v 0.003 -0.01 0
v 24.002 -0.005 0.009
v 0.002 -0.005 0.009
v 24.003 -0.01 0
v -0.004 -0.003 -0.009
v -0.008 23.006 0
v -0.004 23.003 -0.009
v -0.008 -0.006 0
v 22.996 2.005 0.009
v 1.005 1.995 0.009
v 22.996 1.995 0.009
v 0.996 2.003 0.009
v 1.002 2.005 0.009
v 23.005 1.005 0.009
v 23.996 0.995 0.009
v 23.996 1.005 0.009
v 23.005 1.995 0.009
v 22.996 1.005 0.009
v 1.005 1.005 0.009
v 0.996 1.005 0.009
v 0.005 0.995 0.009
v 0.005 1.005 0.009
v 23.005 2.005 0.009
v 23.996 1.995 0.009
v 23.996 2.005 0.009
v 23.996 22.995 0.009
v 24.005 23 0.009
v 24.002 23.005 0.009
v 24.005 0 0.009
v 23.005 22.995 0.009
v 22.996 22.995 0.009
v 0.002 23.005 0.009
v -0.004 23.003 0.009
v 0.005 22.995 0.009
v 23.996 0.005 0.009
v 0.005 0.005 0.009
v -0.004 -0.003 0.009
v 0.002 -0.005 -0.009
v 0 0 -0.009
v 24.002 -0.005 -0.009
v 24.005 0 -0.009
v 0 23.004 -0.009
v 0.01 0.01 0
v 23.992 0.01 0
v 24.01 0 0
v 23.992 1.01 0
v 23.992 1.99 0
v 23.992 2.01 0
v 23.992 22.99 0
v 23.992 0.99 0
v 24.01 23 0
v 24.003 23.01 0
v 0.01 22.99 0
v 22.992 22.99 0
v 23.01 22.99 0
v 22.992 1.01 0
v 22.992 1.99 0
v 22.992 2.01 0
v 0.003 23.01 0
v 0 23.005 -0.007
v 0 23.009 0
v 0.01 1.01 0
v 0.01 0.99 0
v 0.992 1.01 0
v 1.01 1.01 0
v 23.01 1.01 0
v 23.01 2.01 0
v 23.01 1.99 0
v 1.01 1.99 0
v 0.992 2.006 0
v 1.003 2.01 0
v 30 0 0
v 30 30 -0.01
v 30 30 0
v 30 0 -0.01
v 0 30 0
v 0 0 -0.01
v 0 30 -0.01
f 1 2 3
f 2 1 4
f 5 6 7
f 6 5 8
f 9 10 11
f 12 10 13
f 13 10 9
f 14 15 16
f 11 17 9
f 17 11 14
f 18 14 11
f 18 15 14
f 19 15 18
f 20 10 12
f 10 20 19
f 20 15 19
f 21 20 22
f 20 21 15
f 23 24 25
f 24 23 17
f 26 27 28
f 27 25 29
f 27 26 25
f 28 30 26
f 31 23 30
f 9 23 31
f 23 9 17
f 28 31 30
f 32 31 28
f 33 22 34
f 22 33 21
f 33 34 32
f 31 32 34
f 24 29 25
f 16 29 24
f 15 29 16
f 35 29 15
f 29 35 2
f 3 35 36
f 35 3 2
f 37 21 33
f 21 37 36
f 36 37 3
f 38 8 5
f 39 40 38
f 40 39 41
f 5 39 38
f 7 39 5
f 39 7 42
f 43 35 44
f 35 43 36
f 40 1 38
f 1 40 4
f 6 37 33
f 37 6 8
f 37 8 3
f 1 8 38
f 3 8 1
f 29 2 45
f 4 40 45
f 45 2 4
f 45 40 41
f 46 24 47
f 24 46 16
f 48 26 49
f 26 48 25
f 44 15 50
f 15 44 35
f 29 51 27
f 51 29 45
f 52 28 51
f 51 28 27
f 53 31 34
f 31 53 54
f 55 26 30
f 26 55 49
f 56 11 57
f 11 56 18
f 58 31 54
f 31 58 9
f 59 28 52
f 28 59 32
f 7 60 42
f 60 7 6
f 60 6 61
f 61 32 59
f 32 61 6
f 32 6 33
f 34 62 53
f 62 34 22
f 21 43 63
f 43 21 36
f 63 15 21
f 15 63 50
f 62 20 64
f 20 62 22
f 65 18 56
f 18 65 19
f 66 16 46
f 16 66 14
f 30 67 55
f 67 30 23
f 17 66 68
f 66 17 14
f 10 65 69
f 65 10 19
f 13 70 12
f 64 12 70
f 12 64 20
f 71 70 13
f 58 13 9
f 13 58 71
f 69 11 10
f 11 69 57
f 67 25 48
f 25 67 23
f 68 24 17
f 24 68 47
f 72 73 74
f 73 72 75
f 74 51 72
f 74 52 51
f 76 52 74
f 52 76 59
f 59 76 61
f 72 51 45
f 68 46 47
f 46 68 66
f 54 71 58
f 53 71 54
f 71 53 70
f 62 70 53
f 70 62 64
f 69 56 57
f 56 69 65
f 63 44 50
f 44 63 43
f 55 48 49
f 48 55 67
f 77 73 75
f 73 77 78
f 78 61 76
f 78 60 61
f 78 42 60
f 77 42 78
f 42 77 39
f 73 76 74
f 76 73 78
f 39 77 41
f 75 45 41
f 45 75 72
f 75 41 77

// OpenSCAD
hull(){
    translate([0, 0]) sphere(0.01);
    translate([1, 0]) sphere(0.01);
}
hull(){
    translate([1, 0]) sphere(0.01);
    translate([2, 0]) sphere(0.01);
}
hull(){
    translate([2, 0]) sphere(0.01);
    translate([3, 0]) sphere(0.01);
}
hull(){
    translate([3, 0]) sphere(0.01);
    translate([4, 0]) sphere(0.01);
}
hull(){
    translate([4, 0]) sphere(0.01);
    translate([5, 0]) sphere(0.01);
}
hull(){
    translate([5, 0]) sphere(0.01);
    translate([6, 0]) sphere(0.01);
}
hull(){
    translate([6, 0]) sphere(0.01);
    translate([7, 0]) sphere(0.01);
}
hull(){
    translate([7, 0]) sphere(0.01);
    translate([8, 0]) sphere(0.01);
}
hull(){
    translate([8, 0]) sphere(0.01);
    translate([9, 0]) sphere(0.01);
}
hull(){
    translate([9, 0]) sphere(0.01);
    translate([10, 0]) sphere(0.01);
}
hull(){
    translate([10, 0]) sphere(0.01);
    translate([11, 0]) sphere(0.01);
}
hull(){
    translate([11, 0]) sphere(0.01);
    translate([12, 0]) sphere(0.01);
}
hull(){
    translate([12, 0]) sphere(0.01);
    translate([13, 0]) sphere(0.01);
}
hull(){
    translate([13, 0]) sphere(0.01);
    translate([14, 0]) sphere(0.01);
}
hull(){
    translate([14, 0]) sphere(0.01);
    translate([15, 0]) sphere(0.01);
}
hull(){
    translate([15, 0]) sphere(0.01);
    translate([16, 0]) sphere(0.01);
}
hull(){
    translate([16, 0]) sphere(0.01);
    translate([17, 0]) sphere(0.01);
}
hull(){
    translate([17, 0]) sphere(0.01);
    translate([18, 0]) sphere(0.01);
}
hull(){
    translate([18, 0]) sphere(0.01);
    translate([19, 0]) sphere(0.01);
}
hull(){
    translate([19, 0]) sphere(0.01);
    translate([20, 0]) sphere(0.01);
}
hull(){
    translate([20, 0]) sphere(0.01);
    translate([21, 0]) sphere(0.01);
}
hull(){
    translate([21, 0]) sphere(0.01);
    translate([22, 0]) sphere(0.01);
}
hull(){
    translate([22, 0]) sphere(0.01);
    translate([23, 0]) sphere(0.01);
}
hull(){
    translate([23, 0]) sphere(0.01);
    translate([24, 0]) sphere(0.01);
}
hull(){
    translate([24, 0]) sphere(0.01);
    translate([24, 1]) sphere(0.01);
}
hull(){
    translate([24, 1]) sphere(0.01);
    translate([24, 2]) sphere(0.01);
}
hull(){
    translate([24, 2]) sphere(0.01);
    translate([24, 3]) sphere(0.01);
}
hull(){
    translate([24, 3]) sphere(0.01);
    translate([24, 4]) sphere(0.01);
}
hull(){
    translate([24, 4]) sphere(0.01);
    translate([24, 5]) sphere(0.01);
}
hull(){
    translate([24, 5]) sphere(0.01);
    translate([24, 6]) sphere(0.01);
}
hull(){
    translate([24, 6]) sphere(0.01);
    translate([24, 7]) sphere(0.01);
}
hull(){
    translate([24, 7]) sphere(0.01);
    translate([24, 8]) sphere(0.01);
}
hull(){
    translate([24, 8]) sphere(0.01);
    translate([24, 9]) sphere(0.01);
}
hull(){
    translate([24, 9]) sphere(0.01);
    translate([24, 10]) sphere(0.01);
}
hull(){
    translate([24, 10]) sphere(0.01);
    translate([24, 11]) sphere(0.01);
}
hull(){
    translate([24, 11]) sphere(0.01);
    translate([24, 12]) sphere(0.01);
}
hull(){
    translate([24, 12]) sphere(0.01);
    translate([24, 13]) sphere(0.01);
}
hull(){
    translate([24, 13]) sphere(0.01);
    translate([24, 14]) sphere(0.01);
}
hull(){
    translate([24, 14]) sphere(0.01);
    translate([24, 15]) sphere(0.01);
}
hull(){
    translate([24, 15]) sphere(0.01);
    translate([24, 16]) sphere(0.01);
}
hull(){
    translate([24, 16]) sphere(0.01);
    translate([24, 17]) sphere(0.01);
}
hull(){
    translate([24, 17]) sphere(0.01);
    translate([24, 18]) sphere(0.01);
}
hull(){
    translate([24, 18]) sphere(0.01);
    translate([24, 19]) sphere(0.01);
}
hull(){
    translate([24, 19]) sphere(0.01);
    translate([24, 20]) sphere(0.01);
}
hull(){
    translate([24, 20]) sphere(0.01);
    translate([24, 21]) sphere(0.01);
}
hull(){
    translate([24, 21]) sphere(0.01);
    translate([24, 22]) sphere(0.01);
}
hull(){
    translate([24, 22]) sphere(0.01);
    translate([24, 23]) sphere(0.01);
}
hull(){
    translate([24, 23]) sphere(0.01);
    translate([23, 23]) sphere(0.01);
}
hull(){
    translate([23, 23]) sphere(0.01);
    translate([22, 23]) sphere(0.01);
}
hull(){
    translate([22, 23]) sphere(0.01);
    translate([21, 23]) sphere(0.01);
}
hull(){
    translate([21, 23]) sphere(0.01);
    translate([20, 23]) sphere(0.01);
}
hull(){
    translate([20, 23]) sphere(0.01);
    translate([19, 23]) sphere(0.01);
}
hull(){
    translate([19, 23]) sphere(0.01);
    translate([18, 23]) sphere(0.01);
}
hull(){
    translate([18, 23]) sphere(0.01);
    translate([17, 23]) sphere(0.01);
}
hull(){
    translate([17, 23]) sphere(0.01);
    translate([16, 23]) sphere(0.01);
}
hull(){
    translate([16, 23]) sphere(0.01);
    translate([15, 23]) sphere(0.01);
}
hull(){
    translate([15, 23]) sphere(0.01);
    translate([14, 23]) sphere(0.01);
}
hull(){
    translate([14, 23]) sphere(0.01);
    translate([13, 23]) sphere(0.01);
}
hull(){
    translate([13, 23]) sphere(0.01);
    translate([12, 23]) sphere(0.01);
}
hull(){
    translate([12, 23]) sphere(0.01);
    translate([11, 23]) sphere(0.01);
}
hull(){
    translate([11, 23]) sphere(0.01);
    translate([10, 23]) sphere(0.01);
}
hull(){
    translate([10, 23]) sphere(0.01);
    translate([9, 23]) sphere(0.01);
}
hull(){
    translate([9, 23]) sphere(0.01);
    translate([8, 23]) sphere(0.01);
}
hull(){
    translate([8, 23]) sphere(0.01);
    translate([7, 23]) sphere(0.01);
}
hull(){
    translate([7, 23]) sphere(0.01);
    translate([6, 23]) sphere(0.01);
}
hull(){
    translate([6, 23]) sphere(0.01);
    translate([5, 23]) sphere(0.01);
}
hull(){
    translate([5, 23]) sphere(0.01);
    translate([4, 23]) sphere(0.01);
}
hull(){
    translate([4, 23]) sphere(0.01);
    translate([3, 23]) sphere(0.01);
}
hull(){
    translate([3, 23]) sphere(0.01);
    translate([2, 23]) sphere(0.01);
}
hull(){
    translate([2, 23]) sphere(0.01);
    translate([1, 23]) sphere(0.01);
}
hull(){
    translate([1, 23]) sphere(0.01);
    translate([0, 23]) sphere(0.01);
}
hull(){
    translate([0, 23]) sphere(0.01);
    translate([0, 22]) sphere(0.01);
}
hull(){
    translate([0, 22]) sphere(0.01);
    translate([0, 21]) sphere(0.01);
}
hull(){
    translate([0, 21]) sphere(0.01);
    translate([0, 20]) sphere(0.01);
}
hull(){
    translate([0, 20]) sphere(0.01);
    translate([0, 19]) sphere(0.01);
}
hull(){
    translate([0, 19]) sphere(0.01);
    translate([0, 18]) sphere(0.01);
}
hull(){
    translate([0, 18]) sphere(0.01);
    translate([0, 17]) sphere(0.01);
}
hull(){
    translate([0, 17]) sphere(0.01);
    translate([0, 16]) sphere(0.01);
}
hull(){
    translate([0, 16]) sphere(0.01);
    translate([0, 15]) sphere(0.01);
}
hull(){
    translate([0, 15]) sphere(0.01);
    translate([0, 14]) sphere(0.01);
}
hull(){
    translate([0, 14]) sphere(0.01);
    translate([0, 13]) sphere(0.01);
}
hull(){
    translate([0, 13]) sphere(0.01);
    translate([0, 12]) sphere(0.01);
}
hull(){
    translate([0, 12]) sphere(0.01);
    translate([0, 11]) sphere(0.01);
}
hull(){
    translate([0, 11]) sphere(0.01);
    translate([0, 10]) sphere(0.01);
}
hull(){
    translate([0, 10]) sphere(0.01);
    translate([0, 9]) sphere(0.01);
}
hull(){
    translate([0, 9]) sphere(0.01);
    translate([0, 8]) sphere(0.01);
}
hull(){
    translate([0, 8]) sphere(0.01);
    translate([0, 7]) sphere(0.01);
}
hull(){
    translate([0, 7]) sphere(0.01);
    translate([0, 6]) sphere(0.01);
}
hull(){
    translate([0, 6]) sphere(0.01);
    translate([0, 5]) sphere(0.01);
}
hull(){
    translate([0, 5]) sphere(0.01);
    translate([0, 4]) sphere(0.01);
}
hull(){
    translate([0, 4]) sphere(0.01);
    translate([0, 3]) sphere(0.01);
}
hull(){
    translate([0, 3]) sphere(0.01);
    translate([0, 2]) sphere(0.01);
}
hull(){
    translate([0, 2]) sphere(0.01);
    translate([0, 1]) sphere(0.01);
}
hull(){
    translate([0, 1]) sphere(0.01);
    translate([1, 1]) sphere(0.01);
}
hull(){
    translate([1, 1]) sphere(0.01);
    translate([2, 1]) sphere(0.01);
}
hull(){
    translate([2, 1]) sphere(0.01);
    translate([3, 1]) sphere(0.01);
}
hull(){
    translate([3, 1]) sphere(0.01);
    translate([4, 1]) sphere(0.01);
}
hull(){
    translate([4, 1]) sphere(0.01);
    translate([5, 1]) sphere(0.01);
}
hull(){
    translate([5, 1]) sphere(0.01);
    translate([6, 1]) sphere(0.01);
}
hull(){
    translate([6, 1]) sphere(0.01);
    translate([7, 1]) sphere(0.01);
}
hull(){
    translate([7, 1]) sphere(0.01);
    translate([8, 1]) sphere(0.01);
}
hull(){
    translate([8, 1]) sphere(0.01);
    translate([9, 1]) sphere(0.01);
}
hull(){
    translate([9, 1]) sphere(0.01);
    translate([10, 1]) sphere(0.01);
}
hull(){
    translate([10, 1]) sphere(0.01);
    translate([11, 1]) sphere(0.01);
}
hull(){
    translate([11, 1]) sphere(0.01);
    translate([12, 1]) sphere(0.01);
}
hull(){
    translate([12, 1]) sphere(0.01);
    translate([13, 1]) sphere(0.01);
}
hull(){
    translate([13, 1]) sphere(0.01);
    translate([14, 1]) sphere(0.01);
}
hull(){
    translate([14, 1]) sphere(0.01);
    translate([15, 1]) sphere(0.01);
}
hull(){
    translate([15, 1]) sphere(0.01);
    translate([16, 1]) sphere(0.01);
}
hull(){
    translate([16, 1]) sphere(0.01);
    translate([17, 1]) sphere(0.01);
}
hull(){
    translate([17, 1]) sphere(0.01);
    translate([18, 1]) sphere(0.01);
}
hull(){
    translate([18, 1]) sphere(0.01);
    translate([19, 1]) sphere(0.01);
}
hull(){
    translate([19, 1]) sphere(0.01);
    translate([20, 1]) sphere(0.01);
}
hull(){
    translate([20, 1]) sphere(0.01);
    translate([21, 1]) sphere(0.01);
}
hull(){
    translate([21, 1]) sphere(0.01);
    translate([22, 1]) sphere(0.01);
}
hull(){
    translate([22, 1]) sphere(0.01);
    translate([23, 1]) sphere(0.01);
}
hull(){
    translate([23, 1]) sphere(0.01);
    translate([24, 1]) sphere(0.01);
}
hull(){
    translate([24, 1]) sphere(0.01);
    translate([24, 2]) sphere(0.01);
}
hull(){
    translate([24, 2]) sphere(0.01);
    translate([24, 3]) sphere(0.01);
}
hull(){
    translate([24, 3]) sphere(0.01);
    translate([24, 4]) sphere(0.01);
}
hull(){
    translate([24, 4]) sphere(0.01);
    translate([24, 5]) sphere(0.01);
}
hull(){
    translate([24, 5]) sphere(0.01);
    translate([24, 6]) sphere(0.01);
}
hull(){
    translate([24, 6]) sphere(0.01);
    translate([24, 7]) sphere(0.01);
}
hull(){
    translate([24, 7]) sphere(0.01);
    translate([24, 8]) sphere(0.01);
}
hull(){
    translate([24, 8]) sphere(0.01);
    translate([24, 9]) sphere(0.01);
}
hull(){
    translate([24, 9]) sphere(0.01);
    translate([24, 10]) sphere(0.01);
}
hull(){
    translate([24, 10]) sphere(0.01);
    translate([24, 11]) sphere(0.01);
}
hull(){
    translate([24, 11]) sphere(0.01);
    translate([24, 12]) sphere(0.01);
}
hull(){
    translate([24, 12]) sphere(0.01);
    translate([24, 13]) sphere(0.01);
}
hull(){
    translate([24, 13]) sphere(0.01);
    translate([24, 14]) sphere(0.01);
}
hull(){
    translate([24, 14]) sphere(0.01);
    translate([24, 15]) sphere(0.01);
}
hull(){
    translate([24, 15]) sphere(0.01);
    translate([24, 16]) sphere(0.01);
}
hull(){
    translate([24, 16]) sphere(0.01);
    translate([24, 17]) sphere(0.01);
}
hull(){
    translate([24, 17]) sphere(0.01);
    translate([24, 18]) sphere(0.01);
}
hull(){
    translate([24, 18]) sphere(0.01);
    translate([24, 19]) sphere(0.01);
}
hull(){
    translate([24, 19]) sphere(0.01);
    translate([24, 20]) sphere(0.01);
}
hull(){
    translate([24, 20]) sphere(0.01);
    translate([24, 21]) sphere(0.01);
}
hull(){
    translate([24, 21]) sphere(0.01);
    translate([24, 22]) sphere(0.01);
}
hull(){
    translate([24, 22]) sphere(0.01);
    translate([24, 23]) sphere(0.01);
}
hull(){
    translate([24, 23]) sphere(0.01);
    translate([23, 23]) sphere(0.01);
}
hull(){
    translate([23, 23]) sphere(0.01);
    translate([23, 22]) sphere(0.01);
}
hull(){
    translate([23, 22]) sphere(0.01);
    translate([23, 21]) sphere(0.01);
}
hull(){
    translate([23, 21]) sphere(0.01);
    translate([23, 20]) sphere(0.01);
}
hull(){
    translate([23, 20]) sphere(0.01);
    translate([23, 19]) sphere(0.01);
}
hull(){
    translate([23, 19]) sphere(0.01);
    translate([23, 18]) sphere(0.01);
}
hull(){
    translate([23, 18]) sphere(0.01);
    translate([23, 17]) sphere(0.01);
}
hull(){
    translate([23, 17]) sphere(0.01);
    translate([23, 16]) sphere(0.01);
}
hull(){
    translate([23, 16]) sphere(0.01);
    translate([23, 15]) sphere(0.01);
}
hull(){
    translate([23, 15]) sphere(0.01);
    translate([23, 14]) sphere(0.01);
}
hull(){
    translate([23, 14]) sphere(0.01);
    translate([23, 13]) sphere(0.01);
}
hull(){
    translate([23, 13]) sphere(0.01);
    translate([23, 12]) sphere(0.01);
}
hull(){
    translate([23, 12]) sphere(0.01);
    translate([23, 11]) sphere(0.01);
}
hull(){
    translate([23, 11]) sphere(0.01);
    translate([23, 10]) sphere(0.01);
}
hull(){
    translate([23, 10]) sphere(0.01);
    translate([23, 9]) sphere(0.01);
}
hull(){
    translate([23, 9]) sphere(0.01);
    translate([23, 8]) sphere(0.01);
}
hull(){
    translate([23, 8]) sphere(0.01);
    translate([23, 7]) sphere(0.01);
}
hull(){
    translate([23, 7]) sphere(0.01);
    translate([23, 6]) sphere(0.01);
}
hull(){
    translate([23, 6]) sphere(0.01);
    translate([23, 5]) sphere(0.01);
}
hull(){
    translate([23, 5]) sphere(0.01);
    translate([23, 4]) sphere(0.01);
}
hull(){
    translate([23, 4]) sphere(0.01);
    translate([23, 3]) sphere(0.01);
}
hull(){
    translate([23, 3]) sphere(0.01);
    translate([23, 2]) sphere(0.01);
}
hull(){
    translate([23, 2]) sphere(0.01);
    translate([23, 1]) sphere(0.01);
}
hull(){
    translate([23, 1]) sphere(0.01);
    translate([22, 1]) sphere(0.01);
}
hull(){
    translate([22, 1]) sphere(0.01);
    translate([21, 1]) sphere(0.01);
}
hull(){
    translate([21, 1]) sphere(0.01);
    translate([20, 1]) sphere(0.01);
}
hull(){
    translate([20, 1]) sphere(0.01);
    translate([19, 1]) sphere(0.01);
}
hull(){
    translate([19, 1]) sphere(0.01);
    translate([18, 1]) sphere(0.01);
}
hull(){
    translate([18, 1]) sphere(0.01);
    translate([17, 1]) sphere(0.01);
}
hull(){
    translate([17, 1]) sphere(0.01);
    translate([16, 1]) sphere(0.01);
}
hull(){
    translate([16, 1]) sphere(0.01);
    translate([15, 1]) sphere(0.01);
}
hull(){
    translate([15, 1]) sphere(0.01);
    translate([14, 1]) sphere(0.01);
}
hull(){
    translate([14, 1]) sphere(0.01);
    translate([13, 1]) sphere(0.01);
}
hull(){
    translate([13, 1]) sphere(0.01);
    translate([12, 1]) sphere(0.01);
}
hull(){
    translate([12, 1]) sphere(0.01);
    translate([11, 1]) sphere(0.01);
}
hull(){
    translate([11, 1]) sphere(0.01);
    translate([10, 1]) sphere(0.01);
}
hull(){
    translate([10, 1]) sphere(0.01);
    translate([9, 1]) sphere(0.01);
}
hull(){
    translate([9, 1]) sphere(0.01);
    translate([8, 1]) sphere(0.01);
}
hull(){
    translate([8, 1]) sphere(0.01);
    translate([7, 1]) sphere(0.01);
}
hull(){
    translate([7, 1]) sphere(0.01);
    translate([6, 1]) sphere(0.01);
}
hull(){
    translate([6, 1]) sphere(0.01);
    translate([5, 1]) sphere(0.01);
}
hull(){
    translate([5, 1]) sphere(0.01);
    translate([4, 1]) sphere(0.01);
}
hull(){
    translate([4, 1]) sphere(0.01);
    translate([3, 1]) sphere(0.01);
}
hull(){
    translate([3, 1]) sphere(0.01);
    translate([2, 1]) sphere(0.01);
}
hull(){
    translate([2, 1]) sphere(0.01);
    translate([1, 1]) sphere(0.01);
}
hull(){
    translate([1, 1]) sphere(0.01);
    translate([1, 2]) sphere(0.01);
}
hull(){
    translate([1, 2]) sphere(0.01);
    translate([2, 2]) sphere(0.01);
}
hull(){
    translate([2, 2]) sphere(0.01);
    translate([3, 2]) sphere(0.01);
}
hull(){
    translate([3, 2]) sphere(0.01);
    translate([4, 2]) sphere(0.01);
}
hull(){
    translate([4, 2]) sphere(0.01);
    translate([5, 2]) sphere(0.01);
}
hull(){
    translate([5, 2]) sphere(0.01);
    translate([6, 2]) sphere(0.01);
}
hull(){
    translate([6, 2]) sphere(0.01);
    translate([7, 2]) sphere(0.01);
}
hull(){
    translate([7, 2]) sphere(0.01);
    translate([8, 2]) sphere(0.01);
}
hull(){
    translate([8, 2]) sphere(0.01);
    translate([9, 2]) sphere(0.01);
}
hull(){
    translate([9, 2]) sphere(0.01);
    translate([10, 2]) sphere(0.01);
}
hull(){
    translate([10, 2]) sphere(0.01);
    translate([11, 2]) sphere(0.01);
}
hull(){
    translate([11, 2]) sphere(0.01);
    translate([12, 2]) sphere(0.01);
}
hull(){
    translate([12, 2]) sphere(0.01);
    translate([13, 2]) sphere(0.01);
}
hull(){
    translate([13, 2]) sphere(0.01);
    translate([14, 2]) sphere(0.01);
}
hull(){
    translate([14, 2]) sphere(0.01);
    translate([15, 2]) sphere(0.01);
}
hull(){
    translate([15, 2]) sphere(0.01);
    translate([16, 2]) sphere(0.01);
}
hull(){
    translate([16, 2]) sphere(0.01);
    translate([17, 2]) sphere(0.01);
}
hull(){
    translate([17, 2]) sphere(0.01);
    translate([18, 2]) sphere(0.01);
}
hull(){
    translate([18, 2]) sphere(0.01);
    translate([19, 2]) sphere(0.01);
}
hull(){
    translate([19, 2]) sphere(0.01);
    translate([20, 2]) sphere(0.01);
}
hull(){
    translate([20, 2]) sphere(0.01);
    translate([21, 2]) sphere(0.01);
}
hull(){
    translate([21, 2]) sphere(0.01);
    translate([22, 2]) sphere(0.01);
}
hull(){
    translate([22, 2]) sphere(0.01);
    translate([23, 2]) sphere(0.01);
}
hull(){
    translate([23, 2]) sphere(0.01);
    translate([24, 2]) sphere(0.01);
}
hull(){
    translate([24, 2]) sphere(0.01);
    translate([24, 3]) sphere(0.01);
}
hull(){
    translate([24, 3]) sphere(0.01);
    translate([24, 4]) sphere(0.01);
}
hull(){
    translate([24, 4]) sphere(0.01);
    translate([24, 5]) sphere(0.01);
}
hull(){
    translate([24, 5]) sphere(0.01);
    translate([24, 6]) sphere(0.01);
}
hull(){
    translate([24, 6]) sphere(0.01);
    translate([24, 7]) sphere(0.01);
}
hull(){
    translate([24, 7]) sphere(0.01);
    translate([24, 8]) sphere(0.01);
}
hull(){
    translate([24, 8]) sphere(0.01);
    translate([24, 9]) sphere(0.01);
}
hull(){
    translate([24, 9]) sphere(0.01);
    translate([24, 10]) sphere(0.01);
}
hull(){
    translate([24, 10]) sphere(0.01);
    translate([24, 11]) sphere(0.01);
}
hull(){
    translate([24, 11]) sphere(0.01);
    translate([24, 12]) sphere(0.01);
}
hull(){
    translate([24, 12]) sphere(0.01);
    translate([24, 13]) sphere(0.01);
}
hull(){
    translate([24, 13]) sphere(0.01);
    translate([24, 14]) sphere(0.01);
}
hull(){
    translate([24, 14]) sphere(0.01);
    translate([24, 15]) sphere(0.01);
}
hull(){
    translate([24, 15]) sphere(0.01);
    translate([24, 16]) sphere(0.01);
}
hull(){
    translate([24, 16]) sphere(0.01);
    translate([24, 17]) sphere(0.01);
}
hull(){
    translate([24, 17]) sphere(0.01);
    translate([24, 18]) sphere(0.01);
}
hull(){
    translate([24, 18]) sphere(0.01);
    translate([24, 19]) sphere(0.01);
}
hull(){
    translate([24, 19]) sphere(0.01);
    translate([24, 20]) sphere(0.01);
}
hull(){
    translate([24, 20]) sphere(0.01);
    translate([24, 21]) sphere(0.01);
}
hull(){
    translate([24, 21]) sphere(0.01);
    translate([24, 22]) sphere(0.01);
}
hull(){
    translate([24, 22]) sphere(0.01);
    translate([24, 23]) sphere(0.01);
}
hull(){
    translate([24, 23]) sphere(0.01);
    translate([23, 23]) sphere(0.01);
}
hull(){
    translate([23, 23]) sphere(0.01);
    translate([22, 23]) sphere(0.01);
}
hull(){
    translate([22, 23]) sphere(0.01);
    translate([21, 23]) sphere(0.01);
}
hull(){
    translate([21, 23]) sphere(0.01);
    translate([20, 23]) sphere(0.01);
}
hull(){
    translate([20, 23]) sphere(0.01);
    translate([19, 23]) sphere(0.01);
}
hull(){
    translate([19, 23]) sphere(0.01);
    translate([18, 23]) sphere(0.01);
}
hull(){
    translate([18, 23]) sphere(0.01);
    translate([17, 23]) sphere(0.01);
}
hull(){
    translate([17, 23]) sphere(0.01);
    translate([16, 23]) sphere(0.01);
}
hull(){
    translate([16, 23]) sphere(0.01);
    translate([15, 23]) sphere(0.01);
}
hull(){
    translate([15, 23]) sphere(0.01);
    translate([14, 23]) sphere(0.01);
}
hull(){
    translate([14, 23]) sphere(0.01);
    translate([13, 23]) sphere(0.01);
}
hull(){
    translate([13, 23]) sphere(0.01);
    translate([12, 23]) sphere(0.01);
}
hull(){
    translate([12, 23]) sphere(0.01);
    translate([11, 23]) sphere(0.01);
}
hull(){
    translate([11, 23]) sphere(0.01);
    translate([10, 23]) sphere(0.01);
}
hull(){
    translate([10, 23]) sphere(0.01);
    translate([9, 23]) sphere(0.01);
}
hull(){
    translate([9, 23]) sphere(0.01);
    translate([8, 23]) sphere(0.01);
}
hull(){
    translate([8, 23]) sphere(0.01);
    translate([7, 23]) sphere(0.01);
}
hull(){
    translate([7, 23]) sphere(0.01);
    translate([6, 23]) sphere(0.01);
}
hull(){
    translate([6, 23]) sphere(0.01);
    translate([5, 23]) sphere(0.01);
}
hull(){
    translate([5, 23]) sphere(0.01);
    translate([4, 23]) sphere(0.01);
}
hull(){
    translate([4, 23]) sphere(0.01);
    translate([3, 23]) sphere(0.01);
}
hull(){
    translate([3, 23]) sphere(0.01);
    translate([2, 23]) sphere(0.01);
}
hull(){
    translate([2, 23]) sphere(0.01);
    translate([1, 23]) sphere(0.01);
}
hull(){
    translate([1, 23]) sphere(0.01);
    translate([0, 23]) sphere(0.01);
}
hull(){
    translate([0, 23]) sphere(0.01);
    translate([0, 22]) sphere(0.01);
}
hull(){
    translate([0, 22]) sphere(0.01);
    translate([0, 21]) sphere(0.01);
}
hull(){
    translate([0, 21]) sphere(0.01);
    translate([0, 20]) sphere(0.01);
}
hull(){
    translate([0, 20]) sphere(0.01);
    translate([0, 19]) sphere(0.01);
}
hull(){
    translate([0, 19]) sphere(0.01);
    translate([0, 18]) sphere(0.01);
}
hull(){
    translate([0, 18]) sphere(0.01);
    translate([0, 17]) sphere(0.01);
}
hull(){
    translate([0, 17]) sphere(0.01);
    translate([0, 16]) sphere(0.01);
}
hull(){
    translate([0, 16]) sphere(0.01);
    translate([0, 15]) sphere(0.01);
}
hull(){
    translate([0, 15]) sphere(0.01);
    translate([0, 14]) sphere(0.01);
}
hull(){
    translate([0, 14]) sphere(0.01);
    translate([0, 13]) sphere(0.01);
}
hull(){
    translate([0, 13]) sphere(0.01);
    translate([0, 12]) sphere(0.01);
}
hull(){
    translate([0, 12]) sphere(0.01);
    translate([0, 11]) sphere(0.01);
}
hull(){
    translate([0, 11]) sphere(0.01);
    translate([0, 10]) sphere(0.01);
}
hull(){
    translate([0, 10]) sphere(0.01);
    translate([0, 9]) sphere(0.01);
}
hull(){
    translate([0, 9]) sphere(0.01);
    translate([0, 8]) sphere(0.01);
}
hull(){
    translate([0, 8]) sphere(0.01);
    translate([0, 7]) sphere(0.01);
}
hull(){
    translate([0, 7]) sphere(0.01);
    translate([0, 6]) sphere(0.01);
}
hull(){
    translate([0, 6]) sphere(0.01);
    translate([0, 5]) sphere(0.01);
}
hull(){
    translate([0, 5]) sphere(0.01);
    translate([0, 4]) sphere(0.01);
}
hull(){
    translate([0, 4]) sphere(0.01);
    translate([0, 3]) sphere(0.01);
}
hull(){
    translate([0, 3]) sphere(0.01);
    translate([0, 2]) sphere(0.01);
}
hull(){
    translate([0, 2]) sphere(0.01);
    translate([0, 1]) sphere(0.01);
}
hull(){
    translate([0, 1]) sphere(0.01);
    translate([0, 0]) sphere(0.01);
}
translate([0,0,-0.01]) color([0.1,0.1,0.1]) cube([30,30,0.01]);
